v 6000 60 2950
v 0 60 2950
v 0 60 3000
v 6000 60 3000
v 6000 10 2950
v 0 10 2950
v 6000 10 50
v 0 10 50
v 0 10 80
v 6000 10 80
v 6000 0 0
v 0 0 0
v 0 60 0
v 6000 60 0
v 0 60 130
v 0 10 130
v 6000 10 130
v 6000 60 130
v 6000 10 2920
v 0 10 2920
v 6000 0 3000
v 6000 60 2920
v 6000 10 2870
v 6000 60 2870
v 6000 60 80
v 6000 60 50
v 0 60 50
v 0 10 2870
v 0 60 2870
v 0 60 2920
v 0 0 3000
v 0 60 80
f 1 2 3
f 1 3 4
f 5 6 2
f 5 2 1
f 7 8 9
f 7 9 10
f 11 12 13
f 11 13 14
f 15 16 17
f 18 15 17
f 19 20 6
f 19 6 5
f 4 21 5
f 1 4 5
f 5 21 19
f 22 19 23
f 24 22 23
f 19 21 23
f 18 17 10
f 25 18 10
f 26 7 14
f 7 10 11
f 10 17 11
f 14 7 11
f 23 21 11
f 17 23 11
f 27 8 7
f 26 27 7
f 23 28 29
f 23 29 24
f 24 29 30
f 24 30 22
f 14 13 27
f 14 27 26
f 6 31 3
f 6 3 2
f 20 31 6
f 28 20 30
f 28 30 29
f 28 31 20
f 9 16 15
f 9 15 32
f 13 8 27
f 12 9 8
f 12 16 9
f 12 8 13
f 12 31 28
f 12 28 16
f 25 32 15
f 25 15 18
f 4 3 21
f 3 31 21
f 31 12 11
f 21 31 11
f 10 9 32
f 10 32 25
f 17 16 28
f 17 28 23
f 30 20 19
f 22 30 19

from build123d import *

# Parameters (mm, degrees)
SKETCH1_W           = 6000
SKETCH1_H           = 3000
BOSS_EXTRUDE1_DEPTH = 10
SKETCH3_W           = 6000
SKETCH3_H           = 50
BOSS_EXTRUDE2_DEPTH = 50
SKETCH4_W           = 6000
SKETCH4_H           = 50
BOSS_EXTRUDE3_DEPTH = 50


with BuildPart() as part:
    # Sketch1 → Boss-Extrude1 (new body)
    with BuildSketch(Plane(origin=(0, 0, 0), x_dir=(1, 0, 0), z_dir=(0, 1, 0))):
        with Locations((3000, -1500)):
            Rectangle(SKETCH1_W, SKETCH1_H)
    extrude(amount=BOSS_EXTRUDE1_DEPTH)

    # Sketch3 → Boss-Extrude2 (add)
    with BuildSketch(Plane(origin=(0, 10, 0), x_dir=(1, 0, 0), z_dir=(0, 1, 0))):
        with Locations((3000, -2975)):
            Rectangle(SKETCH3_W, SKETCH3_H)
        with Locations((3000, -2895)):
            Rectangle(SKETCH3_W, SKETCH3_H)
    extrude(amount=BOSS_EXTRUDE2_DEPTH)

    # Sketch4 → Boss-Extrude3 (add)
    with BuildSketch(Plane(origin=(0, 10, 0), x_dir=(1, 0, 0), z_dir=(0, 1, 0))):
        with Locations((3000, -25)):
            Rectangle(SKETCH4_W, SKETCH4_H)
        with Locations((3000, -105)):
            Rectangle(SKETCH4_W, SKETCH4_H)
    extrude(amount=BOSS_EXTRUDE3_DEPTH)


solid = part.part
